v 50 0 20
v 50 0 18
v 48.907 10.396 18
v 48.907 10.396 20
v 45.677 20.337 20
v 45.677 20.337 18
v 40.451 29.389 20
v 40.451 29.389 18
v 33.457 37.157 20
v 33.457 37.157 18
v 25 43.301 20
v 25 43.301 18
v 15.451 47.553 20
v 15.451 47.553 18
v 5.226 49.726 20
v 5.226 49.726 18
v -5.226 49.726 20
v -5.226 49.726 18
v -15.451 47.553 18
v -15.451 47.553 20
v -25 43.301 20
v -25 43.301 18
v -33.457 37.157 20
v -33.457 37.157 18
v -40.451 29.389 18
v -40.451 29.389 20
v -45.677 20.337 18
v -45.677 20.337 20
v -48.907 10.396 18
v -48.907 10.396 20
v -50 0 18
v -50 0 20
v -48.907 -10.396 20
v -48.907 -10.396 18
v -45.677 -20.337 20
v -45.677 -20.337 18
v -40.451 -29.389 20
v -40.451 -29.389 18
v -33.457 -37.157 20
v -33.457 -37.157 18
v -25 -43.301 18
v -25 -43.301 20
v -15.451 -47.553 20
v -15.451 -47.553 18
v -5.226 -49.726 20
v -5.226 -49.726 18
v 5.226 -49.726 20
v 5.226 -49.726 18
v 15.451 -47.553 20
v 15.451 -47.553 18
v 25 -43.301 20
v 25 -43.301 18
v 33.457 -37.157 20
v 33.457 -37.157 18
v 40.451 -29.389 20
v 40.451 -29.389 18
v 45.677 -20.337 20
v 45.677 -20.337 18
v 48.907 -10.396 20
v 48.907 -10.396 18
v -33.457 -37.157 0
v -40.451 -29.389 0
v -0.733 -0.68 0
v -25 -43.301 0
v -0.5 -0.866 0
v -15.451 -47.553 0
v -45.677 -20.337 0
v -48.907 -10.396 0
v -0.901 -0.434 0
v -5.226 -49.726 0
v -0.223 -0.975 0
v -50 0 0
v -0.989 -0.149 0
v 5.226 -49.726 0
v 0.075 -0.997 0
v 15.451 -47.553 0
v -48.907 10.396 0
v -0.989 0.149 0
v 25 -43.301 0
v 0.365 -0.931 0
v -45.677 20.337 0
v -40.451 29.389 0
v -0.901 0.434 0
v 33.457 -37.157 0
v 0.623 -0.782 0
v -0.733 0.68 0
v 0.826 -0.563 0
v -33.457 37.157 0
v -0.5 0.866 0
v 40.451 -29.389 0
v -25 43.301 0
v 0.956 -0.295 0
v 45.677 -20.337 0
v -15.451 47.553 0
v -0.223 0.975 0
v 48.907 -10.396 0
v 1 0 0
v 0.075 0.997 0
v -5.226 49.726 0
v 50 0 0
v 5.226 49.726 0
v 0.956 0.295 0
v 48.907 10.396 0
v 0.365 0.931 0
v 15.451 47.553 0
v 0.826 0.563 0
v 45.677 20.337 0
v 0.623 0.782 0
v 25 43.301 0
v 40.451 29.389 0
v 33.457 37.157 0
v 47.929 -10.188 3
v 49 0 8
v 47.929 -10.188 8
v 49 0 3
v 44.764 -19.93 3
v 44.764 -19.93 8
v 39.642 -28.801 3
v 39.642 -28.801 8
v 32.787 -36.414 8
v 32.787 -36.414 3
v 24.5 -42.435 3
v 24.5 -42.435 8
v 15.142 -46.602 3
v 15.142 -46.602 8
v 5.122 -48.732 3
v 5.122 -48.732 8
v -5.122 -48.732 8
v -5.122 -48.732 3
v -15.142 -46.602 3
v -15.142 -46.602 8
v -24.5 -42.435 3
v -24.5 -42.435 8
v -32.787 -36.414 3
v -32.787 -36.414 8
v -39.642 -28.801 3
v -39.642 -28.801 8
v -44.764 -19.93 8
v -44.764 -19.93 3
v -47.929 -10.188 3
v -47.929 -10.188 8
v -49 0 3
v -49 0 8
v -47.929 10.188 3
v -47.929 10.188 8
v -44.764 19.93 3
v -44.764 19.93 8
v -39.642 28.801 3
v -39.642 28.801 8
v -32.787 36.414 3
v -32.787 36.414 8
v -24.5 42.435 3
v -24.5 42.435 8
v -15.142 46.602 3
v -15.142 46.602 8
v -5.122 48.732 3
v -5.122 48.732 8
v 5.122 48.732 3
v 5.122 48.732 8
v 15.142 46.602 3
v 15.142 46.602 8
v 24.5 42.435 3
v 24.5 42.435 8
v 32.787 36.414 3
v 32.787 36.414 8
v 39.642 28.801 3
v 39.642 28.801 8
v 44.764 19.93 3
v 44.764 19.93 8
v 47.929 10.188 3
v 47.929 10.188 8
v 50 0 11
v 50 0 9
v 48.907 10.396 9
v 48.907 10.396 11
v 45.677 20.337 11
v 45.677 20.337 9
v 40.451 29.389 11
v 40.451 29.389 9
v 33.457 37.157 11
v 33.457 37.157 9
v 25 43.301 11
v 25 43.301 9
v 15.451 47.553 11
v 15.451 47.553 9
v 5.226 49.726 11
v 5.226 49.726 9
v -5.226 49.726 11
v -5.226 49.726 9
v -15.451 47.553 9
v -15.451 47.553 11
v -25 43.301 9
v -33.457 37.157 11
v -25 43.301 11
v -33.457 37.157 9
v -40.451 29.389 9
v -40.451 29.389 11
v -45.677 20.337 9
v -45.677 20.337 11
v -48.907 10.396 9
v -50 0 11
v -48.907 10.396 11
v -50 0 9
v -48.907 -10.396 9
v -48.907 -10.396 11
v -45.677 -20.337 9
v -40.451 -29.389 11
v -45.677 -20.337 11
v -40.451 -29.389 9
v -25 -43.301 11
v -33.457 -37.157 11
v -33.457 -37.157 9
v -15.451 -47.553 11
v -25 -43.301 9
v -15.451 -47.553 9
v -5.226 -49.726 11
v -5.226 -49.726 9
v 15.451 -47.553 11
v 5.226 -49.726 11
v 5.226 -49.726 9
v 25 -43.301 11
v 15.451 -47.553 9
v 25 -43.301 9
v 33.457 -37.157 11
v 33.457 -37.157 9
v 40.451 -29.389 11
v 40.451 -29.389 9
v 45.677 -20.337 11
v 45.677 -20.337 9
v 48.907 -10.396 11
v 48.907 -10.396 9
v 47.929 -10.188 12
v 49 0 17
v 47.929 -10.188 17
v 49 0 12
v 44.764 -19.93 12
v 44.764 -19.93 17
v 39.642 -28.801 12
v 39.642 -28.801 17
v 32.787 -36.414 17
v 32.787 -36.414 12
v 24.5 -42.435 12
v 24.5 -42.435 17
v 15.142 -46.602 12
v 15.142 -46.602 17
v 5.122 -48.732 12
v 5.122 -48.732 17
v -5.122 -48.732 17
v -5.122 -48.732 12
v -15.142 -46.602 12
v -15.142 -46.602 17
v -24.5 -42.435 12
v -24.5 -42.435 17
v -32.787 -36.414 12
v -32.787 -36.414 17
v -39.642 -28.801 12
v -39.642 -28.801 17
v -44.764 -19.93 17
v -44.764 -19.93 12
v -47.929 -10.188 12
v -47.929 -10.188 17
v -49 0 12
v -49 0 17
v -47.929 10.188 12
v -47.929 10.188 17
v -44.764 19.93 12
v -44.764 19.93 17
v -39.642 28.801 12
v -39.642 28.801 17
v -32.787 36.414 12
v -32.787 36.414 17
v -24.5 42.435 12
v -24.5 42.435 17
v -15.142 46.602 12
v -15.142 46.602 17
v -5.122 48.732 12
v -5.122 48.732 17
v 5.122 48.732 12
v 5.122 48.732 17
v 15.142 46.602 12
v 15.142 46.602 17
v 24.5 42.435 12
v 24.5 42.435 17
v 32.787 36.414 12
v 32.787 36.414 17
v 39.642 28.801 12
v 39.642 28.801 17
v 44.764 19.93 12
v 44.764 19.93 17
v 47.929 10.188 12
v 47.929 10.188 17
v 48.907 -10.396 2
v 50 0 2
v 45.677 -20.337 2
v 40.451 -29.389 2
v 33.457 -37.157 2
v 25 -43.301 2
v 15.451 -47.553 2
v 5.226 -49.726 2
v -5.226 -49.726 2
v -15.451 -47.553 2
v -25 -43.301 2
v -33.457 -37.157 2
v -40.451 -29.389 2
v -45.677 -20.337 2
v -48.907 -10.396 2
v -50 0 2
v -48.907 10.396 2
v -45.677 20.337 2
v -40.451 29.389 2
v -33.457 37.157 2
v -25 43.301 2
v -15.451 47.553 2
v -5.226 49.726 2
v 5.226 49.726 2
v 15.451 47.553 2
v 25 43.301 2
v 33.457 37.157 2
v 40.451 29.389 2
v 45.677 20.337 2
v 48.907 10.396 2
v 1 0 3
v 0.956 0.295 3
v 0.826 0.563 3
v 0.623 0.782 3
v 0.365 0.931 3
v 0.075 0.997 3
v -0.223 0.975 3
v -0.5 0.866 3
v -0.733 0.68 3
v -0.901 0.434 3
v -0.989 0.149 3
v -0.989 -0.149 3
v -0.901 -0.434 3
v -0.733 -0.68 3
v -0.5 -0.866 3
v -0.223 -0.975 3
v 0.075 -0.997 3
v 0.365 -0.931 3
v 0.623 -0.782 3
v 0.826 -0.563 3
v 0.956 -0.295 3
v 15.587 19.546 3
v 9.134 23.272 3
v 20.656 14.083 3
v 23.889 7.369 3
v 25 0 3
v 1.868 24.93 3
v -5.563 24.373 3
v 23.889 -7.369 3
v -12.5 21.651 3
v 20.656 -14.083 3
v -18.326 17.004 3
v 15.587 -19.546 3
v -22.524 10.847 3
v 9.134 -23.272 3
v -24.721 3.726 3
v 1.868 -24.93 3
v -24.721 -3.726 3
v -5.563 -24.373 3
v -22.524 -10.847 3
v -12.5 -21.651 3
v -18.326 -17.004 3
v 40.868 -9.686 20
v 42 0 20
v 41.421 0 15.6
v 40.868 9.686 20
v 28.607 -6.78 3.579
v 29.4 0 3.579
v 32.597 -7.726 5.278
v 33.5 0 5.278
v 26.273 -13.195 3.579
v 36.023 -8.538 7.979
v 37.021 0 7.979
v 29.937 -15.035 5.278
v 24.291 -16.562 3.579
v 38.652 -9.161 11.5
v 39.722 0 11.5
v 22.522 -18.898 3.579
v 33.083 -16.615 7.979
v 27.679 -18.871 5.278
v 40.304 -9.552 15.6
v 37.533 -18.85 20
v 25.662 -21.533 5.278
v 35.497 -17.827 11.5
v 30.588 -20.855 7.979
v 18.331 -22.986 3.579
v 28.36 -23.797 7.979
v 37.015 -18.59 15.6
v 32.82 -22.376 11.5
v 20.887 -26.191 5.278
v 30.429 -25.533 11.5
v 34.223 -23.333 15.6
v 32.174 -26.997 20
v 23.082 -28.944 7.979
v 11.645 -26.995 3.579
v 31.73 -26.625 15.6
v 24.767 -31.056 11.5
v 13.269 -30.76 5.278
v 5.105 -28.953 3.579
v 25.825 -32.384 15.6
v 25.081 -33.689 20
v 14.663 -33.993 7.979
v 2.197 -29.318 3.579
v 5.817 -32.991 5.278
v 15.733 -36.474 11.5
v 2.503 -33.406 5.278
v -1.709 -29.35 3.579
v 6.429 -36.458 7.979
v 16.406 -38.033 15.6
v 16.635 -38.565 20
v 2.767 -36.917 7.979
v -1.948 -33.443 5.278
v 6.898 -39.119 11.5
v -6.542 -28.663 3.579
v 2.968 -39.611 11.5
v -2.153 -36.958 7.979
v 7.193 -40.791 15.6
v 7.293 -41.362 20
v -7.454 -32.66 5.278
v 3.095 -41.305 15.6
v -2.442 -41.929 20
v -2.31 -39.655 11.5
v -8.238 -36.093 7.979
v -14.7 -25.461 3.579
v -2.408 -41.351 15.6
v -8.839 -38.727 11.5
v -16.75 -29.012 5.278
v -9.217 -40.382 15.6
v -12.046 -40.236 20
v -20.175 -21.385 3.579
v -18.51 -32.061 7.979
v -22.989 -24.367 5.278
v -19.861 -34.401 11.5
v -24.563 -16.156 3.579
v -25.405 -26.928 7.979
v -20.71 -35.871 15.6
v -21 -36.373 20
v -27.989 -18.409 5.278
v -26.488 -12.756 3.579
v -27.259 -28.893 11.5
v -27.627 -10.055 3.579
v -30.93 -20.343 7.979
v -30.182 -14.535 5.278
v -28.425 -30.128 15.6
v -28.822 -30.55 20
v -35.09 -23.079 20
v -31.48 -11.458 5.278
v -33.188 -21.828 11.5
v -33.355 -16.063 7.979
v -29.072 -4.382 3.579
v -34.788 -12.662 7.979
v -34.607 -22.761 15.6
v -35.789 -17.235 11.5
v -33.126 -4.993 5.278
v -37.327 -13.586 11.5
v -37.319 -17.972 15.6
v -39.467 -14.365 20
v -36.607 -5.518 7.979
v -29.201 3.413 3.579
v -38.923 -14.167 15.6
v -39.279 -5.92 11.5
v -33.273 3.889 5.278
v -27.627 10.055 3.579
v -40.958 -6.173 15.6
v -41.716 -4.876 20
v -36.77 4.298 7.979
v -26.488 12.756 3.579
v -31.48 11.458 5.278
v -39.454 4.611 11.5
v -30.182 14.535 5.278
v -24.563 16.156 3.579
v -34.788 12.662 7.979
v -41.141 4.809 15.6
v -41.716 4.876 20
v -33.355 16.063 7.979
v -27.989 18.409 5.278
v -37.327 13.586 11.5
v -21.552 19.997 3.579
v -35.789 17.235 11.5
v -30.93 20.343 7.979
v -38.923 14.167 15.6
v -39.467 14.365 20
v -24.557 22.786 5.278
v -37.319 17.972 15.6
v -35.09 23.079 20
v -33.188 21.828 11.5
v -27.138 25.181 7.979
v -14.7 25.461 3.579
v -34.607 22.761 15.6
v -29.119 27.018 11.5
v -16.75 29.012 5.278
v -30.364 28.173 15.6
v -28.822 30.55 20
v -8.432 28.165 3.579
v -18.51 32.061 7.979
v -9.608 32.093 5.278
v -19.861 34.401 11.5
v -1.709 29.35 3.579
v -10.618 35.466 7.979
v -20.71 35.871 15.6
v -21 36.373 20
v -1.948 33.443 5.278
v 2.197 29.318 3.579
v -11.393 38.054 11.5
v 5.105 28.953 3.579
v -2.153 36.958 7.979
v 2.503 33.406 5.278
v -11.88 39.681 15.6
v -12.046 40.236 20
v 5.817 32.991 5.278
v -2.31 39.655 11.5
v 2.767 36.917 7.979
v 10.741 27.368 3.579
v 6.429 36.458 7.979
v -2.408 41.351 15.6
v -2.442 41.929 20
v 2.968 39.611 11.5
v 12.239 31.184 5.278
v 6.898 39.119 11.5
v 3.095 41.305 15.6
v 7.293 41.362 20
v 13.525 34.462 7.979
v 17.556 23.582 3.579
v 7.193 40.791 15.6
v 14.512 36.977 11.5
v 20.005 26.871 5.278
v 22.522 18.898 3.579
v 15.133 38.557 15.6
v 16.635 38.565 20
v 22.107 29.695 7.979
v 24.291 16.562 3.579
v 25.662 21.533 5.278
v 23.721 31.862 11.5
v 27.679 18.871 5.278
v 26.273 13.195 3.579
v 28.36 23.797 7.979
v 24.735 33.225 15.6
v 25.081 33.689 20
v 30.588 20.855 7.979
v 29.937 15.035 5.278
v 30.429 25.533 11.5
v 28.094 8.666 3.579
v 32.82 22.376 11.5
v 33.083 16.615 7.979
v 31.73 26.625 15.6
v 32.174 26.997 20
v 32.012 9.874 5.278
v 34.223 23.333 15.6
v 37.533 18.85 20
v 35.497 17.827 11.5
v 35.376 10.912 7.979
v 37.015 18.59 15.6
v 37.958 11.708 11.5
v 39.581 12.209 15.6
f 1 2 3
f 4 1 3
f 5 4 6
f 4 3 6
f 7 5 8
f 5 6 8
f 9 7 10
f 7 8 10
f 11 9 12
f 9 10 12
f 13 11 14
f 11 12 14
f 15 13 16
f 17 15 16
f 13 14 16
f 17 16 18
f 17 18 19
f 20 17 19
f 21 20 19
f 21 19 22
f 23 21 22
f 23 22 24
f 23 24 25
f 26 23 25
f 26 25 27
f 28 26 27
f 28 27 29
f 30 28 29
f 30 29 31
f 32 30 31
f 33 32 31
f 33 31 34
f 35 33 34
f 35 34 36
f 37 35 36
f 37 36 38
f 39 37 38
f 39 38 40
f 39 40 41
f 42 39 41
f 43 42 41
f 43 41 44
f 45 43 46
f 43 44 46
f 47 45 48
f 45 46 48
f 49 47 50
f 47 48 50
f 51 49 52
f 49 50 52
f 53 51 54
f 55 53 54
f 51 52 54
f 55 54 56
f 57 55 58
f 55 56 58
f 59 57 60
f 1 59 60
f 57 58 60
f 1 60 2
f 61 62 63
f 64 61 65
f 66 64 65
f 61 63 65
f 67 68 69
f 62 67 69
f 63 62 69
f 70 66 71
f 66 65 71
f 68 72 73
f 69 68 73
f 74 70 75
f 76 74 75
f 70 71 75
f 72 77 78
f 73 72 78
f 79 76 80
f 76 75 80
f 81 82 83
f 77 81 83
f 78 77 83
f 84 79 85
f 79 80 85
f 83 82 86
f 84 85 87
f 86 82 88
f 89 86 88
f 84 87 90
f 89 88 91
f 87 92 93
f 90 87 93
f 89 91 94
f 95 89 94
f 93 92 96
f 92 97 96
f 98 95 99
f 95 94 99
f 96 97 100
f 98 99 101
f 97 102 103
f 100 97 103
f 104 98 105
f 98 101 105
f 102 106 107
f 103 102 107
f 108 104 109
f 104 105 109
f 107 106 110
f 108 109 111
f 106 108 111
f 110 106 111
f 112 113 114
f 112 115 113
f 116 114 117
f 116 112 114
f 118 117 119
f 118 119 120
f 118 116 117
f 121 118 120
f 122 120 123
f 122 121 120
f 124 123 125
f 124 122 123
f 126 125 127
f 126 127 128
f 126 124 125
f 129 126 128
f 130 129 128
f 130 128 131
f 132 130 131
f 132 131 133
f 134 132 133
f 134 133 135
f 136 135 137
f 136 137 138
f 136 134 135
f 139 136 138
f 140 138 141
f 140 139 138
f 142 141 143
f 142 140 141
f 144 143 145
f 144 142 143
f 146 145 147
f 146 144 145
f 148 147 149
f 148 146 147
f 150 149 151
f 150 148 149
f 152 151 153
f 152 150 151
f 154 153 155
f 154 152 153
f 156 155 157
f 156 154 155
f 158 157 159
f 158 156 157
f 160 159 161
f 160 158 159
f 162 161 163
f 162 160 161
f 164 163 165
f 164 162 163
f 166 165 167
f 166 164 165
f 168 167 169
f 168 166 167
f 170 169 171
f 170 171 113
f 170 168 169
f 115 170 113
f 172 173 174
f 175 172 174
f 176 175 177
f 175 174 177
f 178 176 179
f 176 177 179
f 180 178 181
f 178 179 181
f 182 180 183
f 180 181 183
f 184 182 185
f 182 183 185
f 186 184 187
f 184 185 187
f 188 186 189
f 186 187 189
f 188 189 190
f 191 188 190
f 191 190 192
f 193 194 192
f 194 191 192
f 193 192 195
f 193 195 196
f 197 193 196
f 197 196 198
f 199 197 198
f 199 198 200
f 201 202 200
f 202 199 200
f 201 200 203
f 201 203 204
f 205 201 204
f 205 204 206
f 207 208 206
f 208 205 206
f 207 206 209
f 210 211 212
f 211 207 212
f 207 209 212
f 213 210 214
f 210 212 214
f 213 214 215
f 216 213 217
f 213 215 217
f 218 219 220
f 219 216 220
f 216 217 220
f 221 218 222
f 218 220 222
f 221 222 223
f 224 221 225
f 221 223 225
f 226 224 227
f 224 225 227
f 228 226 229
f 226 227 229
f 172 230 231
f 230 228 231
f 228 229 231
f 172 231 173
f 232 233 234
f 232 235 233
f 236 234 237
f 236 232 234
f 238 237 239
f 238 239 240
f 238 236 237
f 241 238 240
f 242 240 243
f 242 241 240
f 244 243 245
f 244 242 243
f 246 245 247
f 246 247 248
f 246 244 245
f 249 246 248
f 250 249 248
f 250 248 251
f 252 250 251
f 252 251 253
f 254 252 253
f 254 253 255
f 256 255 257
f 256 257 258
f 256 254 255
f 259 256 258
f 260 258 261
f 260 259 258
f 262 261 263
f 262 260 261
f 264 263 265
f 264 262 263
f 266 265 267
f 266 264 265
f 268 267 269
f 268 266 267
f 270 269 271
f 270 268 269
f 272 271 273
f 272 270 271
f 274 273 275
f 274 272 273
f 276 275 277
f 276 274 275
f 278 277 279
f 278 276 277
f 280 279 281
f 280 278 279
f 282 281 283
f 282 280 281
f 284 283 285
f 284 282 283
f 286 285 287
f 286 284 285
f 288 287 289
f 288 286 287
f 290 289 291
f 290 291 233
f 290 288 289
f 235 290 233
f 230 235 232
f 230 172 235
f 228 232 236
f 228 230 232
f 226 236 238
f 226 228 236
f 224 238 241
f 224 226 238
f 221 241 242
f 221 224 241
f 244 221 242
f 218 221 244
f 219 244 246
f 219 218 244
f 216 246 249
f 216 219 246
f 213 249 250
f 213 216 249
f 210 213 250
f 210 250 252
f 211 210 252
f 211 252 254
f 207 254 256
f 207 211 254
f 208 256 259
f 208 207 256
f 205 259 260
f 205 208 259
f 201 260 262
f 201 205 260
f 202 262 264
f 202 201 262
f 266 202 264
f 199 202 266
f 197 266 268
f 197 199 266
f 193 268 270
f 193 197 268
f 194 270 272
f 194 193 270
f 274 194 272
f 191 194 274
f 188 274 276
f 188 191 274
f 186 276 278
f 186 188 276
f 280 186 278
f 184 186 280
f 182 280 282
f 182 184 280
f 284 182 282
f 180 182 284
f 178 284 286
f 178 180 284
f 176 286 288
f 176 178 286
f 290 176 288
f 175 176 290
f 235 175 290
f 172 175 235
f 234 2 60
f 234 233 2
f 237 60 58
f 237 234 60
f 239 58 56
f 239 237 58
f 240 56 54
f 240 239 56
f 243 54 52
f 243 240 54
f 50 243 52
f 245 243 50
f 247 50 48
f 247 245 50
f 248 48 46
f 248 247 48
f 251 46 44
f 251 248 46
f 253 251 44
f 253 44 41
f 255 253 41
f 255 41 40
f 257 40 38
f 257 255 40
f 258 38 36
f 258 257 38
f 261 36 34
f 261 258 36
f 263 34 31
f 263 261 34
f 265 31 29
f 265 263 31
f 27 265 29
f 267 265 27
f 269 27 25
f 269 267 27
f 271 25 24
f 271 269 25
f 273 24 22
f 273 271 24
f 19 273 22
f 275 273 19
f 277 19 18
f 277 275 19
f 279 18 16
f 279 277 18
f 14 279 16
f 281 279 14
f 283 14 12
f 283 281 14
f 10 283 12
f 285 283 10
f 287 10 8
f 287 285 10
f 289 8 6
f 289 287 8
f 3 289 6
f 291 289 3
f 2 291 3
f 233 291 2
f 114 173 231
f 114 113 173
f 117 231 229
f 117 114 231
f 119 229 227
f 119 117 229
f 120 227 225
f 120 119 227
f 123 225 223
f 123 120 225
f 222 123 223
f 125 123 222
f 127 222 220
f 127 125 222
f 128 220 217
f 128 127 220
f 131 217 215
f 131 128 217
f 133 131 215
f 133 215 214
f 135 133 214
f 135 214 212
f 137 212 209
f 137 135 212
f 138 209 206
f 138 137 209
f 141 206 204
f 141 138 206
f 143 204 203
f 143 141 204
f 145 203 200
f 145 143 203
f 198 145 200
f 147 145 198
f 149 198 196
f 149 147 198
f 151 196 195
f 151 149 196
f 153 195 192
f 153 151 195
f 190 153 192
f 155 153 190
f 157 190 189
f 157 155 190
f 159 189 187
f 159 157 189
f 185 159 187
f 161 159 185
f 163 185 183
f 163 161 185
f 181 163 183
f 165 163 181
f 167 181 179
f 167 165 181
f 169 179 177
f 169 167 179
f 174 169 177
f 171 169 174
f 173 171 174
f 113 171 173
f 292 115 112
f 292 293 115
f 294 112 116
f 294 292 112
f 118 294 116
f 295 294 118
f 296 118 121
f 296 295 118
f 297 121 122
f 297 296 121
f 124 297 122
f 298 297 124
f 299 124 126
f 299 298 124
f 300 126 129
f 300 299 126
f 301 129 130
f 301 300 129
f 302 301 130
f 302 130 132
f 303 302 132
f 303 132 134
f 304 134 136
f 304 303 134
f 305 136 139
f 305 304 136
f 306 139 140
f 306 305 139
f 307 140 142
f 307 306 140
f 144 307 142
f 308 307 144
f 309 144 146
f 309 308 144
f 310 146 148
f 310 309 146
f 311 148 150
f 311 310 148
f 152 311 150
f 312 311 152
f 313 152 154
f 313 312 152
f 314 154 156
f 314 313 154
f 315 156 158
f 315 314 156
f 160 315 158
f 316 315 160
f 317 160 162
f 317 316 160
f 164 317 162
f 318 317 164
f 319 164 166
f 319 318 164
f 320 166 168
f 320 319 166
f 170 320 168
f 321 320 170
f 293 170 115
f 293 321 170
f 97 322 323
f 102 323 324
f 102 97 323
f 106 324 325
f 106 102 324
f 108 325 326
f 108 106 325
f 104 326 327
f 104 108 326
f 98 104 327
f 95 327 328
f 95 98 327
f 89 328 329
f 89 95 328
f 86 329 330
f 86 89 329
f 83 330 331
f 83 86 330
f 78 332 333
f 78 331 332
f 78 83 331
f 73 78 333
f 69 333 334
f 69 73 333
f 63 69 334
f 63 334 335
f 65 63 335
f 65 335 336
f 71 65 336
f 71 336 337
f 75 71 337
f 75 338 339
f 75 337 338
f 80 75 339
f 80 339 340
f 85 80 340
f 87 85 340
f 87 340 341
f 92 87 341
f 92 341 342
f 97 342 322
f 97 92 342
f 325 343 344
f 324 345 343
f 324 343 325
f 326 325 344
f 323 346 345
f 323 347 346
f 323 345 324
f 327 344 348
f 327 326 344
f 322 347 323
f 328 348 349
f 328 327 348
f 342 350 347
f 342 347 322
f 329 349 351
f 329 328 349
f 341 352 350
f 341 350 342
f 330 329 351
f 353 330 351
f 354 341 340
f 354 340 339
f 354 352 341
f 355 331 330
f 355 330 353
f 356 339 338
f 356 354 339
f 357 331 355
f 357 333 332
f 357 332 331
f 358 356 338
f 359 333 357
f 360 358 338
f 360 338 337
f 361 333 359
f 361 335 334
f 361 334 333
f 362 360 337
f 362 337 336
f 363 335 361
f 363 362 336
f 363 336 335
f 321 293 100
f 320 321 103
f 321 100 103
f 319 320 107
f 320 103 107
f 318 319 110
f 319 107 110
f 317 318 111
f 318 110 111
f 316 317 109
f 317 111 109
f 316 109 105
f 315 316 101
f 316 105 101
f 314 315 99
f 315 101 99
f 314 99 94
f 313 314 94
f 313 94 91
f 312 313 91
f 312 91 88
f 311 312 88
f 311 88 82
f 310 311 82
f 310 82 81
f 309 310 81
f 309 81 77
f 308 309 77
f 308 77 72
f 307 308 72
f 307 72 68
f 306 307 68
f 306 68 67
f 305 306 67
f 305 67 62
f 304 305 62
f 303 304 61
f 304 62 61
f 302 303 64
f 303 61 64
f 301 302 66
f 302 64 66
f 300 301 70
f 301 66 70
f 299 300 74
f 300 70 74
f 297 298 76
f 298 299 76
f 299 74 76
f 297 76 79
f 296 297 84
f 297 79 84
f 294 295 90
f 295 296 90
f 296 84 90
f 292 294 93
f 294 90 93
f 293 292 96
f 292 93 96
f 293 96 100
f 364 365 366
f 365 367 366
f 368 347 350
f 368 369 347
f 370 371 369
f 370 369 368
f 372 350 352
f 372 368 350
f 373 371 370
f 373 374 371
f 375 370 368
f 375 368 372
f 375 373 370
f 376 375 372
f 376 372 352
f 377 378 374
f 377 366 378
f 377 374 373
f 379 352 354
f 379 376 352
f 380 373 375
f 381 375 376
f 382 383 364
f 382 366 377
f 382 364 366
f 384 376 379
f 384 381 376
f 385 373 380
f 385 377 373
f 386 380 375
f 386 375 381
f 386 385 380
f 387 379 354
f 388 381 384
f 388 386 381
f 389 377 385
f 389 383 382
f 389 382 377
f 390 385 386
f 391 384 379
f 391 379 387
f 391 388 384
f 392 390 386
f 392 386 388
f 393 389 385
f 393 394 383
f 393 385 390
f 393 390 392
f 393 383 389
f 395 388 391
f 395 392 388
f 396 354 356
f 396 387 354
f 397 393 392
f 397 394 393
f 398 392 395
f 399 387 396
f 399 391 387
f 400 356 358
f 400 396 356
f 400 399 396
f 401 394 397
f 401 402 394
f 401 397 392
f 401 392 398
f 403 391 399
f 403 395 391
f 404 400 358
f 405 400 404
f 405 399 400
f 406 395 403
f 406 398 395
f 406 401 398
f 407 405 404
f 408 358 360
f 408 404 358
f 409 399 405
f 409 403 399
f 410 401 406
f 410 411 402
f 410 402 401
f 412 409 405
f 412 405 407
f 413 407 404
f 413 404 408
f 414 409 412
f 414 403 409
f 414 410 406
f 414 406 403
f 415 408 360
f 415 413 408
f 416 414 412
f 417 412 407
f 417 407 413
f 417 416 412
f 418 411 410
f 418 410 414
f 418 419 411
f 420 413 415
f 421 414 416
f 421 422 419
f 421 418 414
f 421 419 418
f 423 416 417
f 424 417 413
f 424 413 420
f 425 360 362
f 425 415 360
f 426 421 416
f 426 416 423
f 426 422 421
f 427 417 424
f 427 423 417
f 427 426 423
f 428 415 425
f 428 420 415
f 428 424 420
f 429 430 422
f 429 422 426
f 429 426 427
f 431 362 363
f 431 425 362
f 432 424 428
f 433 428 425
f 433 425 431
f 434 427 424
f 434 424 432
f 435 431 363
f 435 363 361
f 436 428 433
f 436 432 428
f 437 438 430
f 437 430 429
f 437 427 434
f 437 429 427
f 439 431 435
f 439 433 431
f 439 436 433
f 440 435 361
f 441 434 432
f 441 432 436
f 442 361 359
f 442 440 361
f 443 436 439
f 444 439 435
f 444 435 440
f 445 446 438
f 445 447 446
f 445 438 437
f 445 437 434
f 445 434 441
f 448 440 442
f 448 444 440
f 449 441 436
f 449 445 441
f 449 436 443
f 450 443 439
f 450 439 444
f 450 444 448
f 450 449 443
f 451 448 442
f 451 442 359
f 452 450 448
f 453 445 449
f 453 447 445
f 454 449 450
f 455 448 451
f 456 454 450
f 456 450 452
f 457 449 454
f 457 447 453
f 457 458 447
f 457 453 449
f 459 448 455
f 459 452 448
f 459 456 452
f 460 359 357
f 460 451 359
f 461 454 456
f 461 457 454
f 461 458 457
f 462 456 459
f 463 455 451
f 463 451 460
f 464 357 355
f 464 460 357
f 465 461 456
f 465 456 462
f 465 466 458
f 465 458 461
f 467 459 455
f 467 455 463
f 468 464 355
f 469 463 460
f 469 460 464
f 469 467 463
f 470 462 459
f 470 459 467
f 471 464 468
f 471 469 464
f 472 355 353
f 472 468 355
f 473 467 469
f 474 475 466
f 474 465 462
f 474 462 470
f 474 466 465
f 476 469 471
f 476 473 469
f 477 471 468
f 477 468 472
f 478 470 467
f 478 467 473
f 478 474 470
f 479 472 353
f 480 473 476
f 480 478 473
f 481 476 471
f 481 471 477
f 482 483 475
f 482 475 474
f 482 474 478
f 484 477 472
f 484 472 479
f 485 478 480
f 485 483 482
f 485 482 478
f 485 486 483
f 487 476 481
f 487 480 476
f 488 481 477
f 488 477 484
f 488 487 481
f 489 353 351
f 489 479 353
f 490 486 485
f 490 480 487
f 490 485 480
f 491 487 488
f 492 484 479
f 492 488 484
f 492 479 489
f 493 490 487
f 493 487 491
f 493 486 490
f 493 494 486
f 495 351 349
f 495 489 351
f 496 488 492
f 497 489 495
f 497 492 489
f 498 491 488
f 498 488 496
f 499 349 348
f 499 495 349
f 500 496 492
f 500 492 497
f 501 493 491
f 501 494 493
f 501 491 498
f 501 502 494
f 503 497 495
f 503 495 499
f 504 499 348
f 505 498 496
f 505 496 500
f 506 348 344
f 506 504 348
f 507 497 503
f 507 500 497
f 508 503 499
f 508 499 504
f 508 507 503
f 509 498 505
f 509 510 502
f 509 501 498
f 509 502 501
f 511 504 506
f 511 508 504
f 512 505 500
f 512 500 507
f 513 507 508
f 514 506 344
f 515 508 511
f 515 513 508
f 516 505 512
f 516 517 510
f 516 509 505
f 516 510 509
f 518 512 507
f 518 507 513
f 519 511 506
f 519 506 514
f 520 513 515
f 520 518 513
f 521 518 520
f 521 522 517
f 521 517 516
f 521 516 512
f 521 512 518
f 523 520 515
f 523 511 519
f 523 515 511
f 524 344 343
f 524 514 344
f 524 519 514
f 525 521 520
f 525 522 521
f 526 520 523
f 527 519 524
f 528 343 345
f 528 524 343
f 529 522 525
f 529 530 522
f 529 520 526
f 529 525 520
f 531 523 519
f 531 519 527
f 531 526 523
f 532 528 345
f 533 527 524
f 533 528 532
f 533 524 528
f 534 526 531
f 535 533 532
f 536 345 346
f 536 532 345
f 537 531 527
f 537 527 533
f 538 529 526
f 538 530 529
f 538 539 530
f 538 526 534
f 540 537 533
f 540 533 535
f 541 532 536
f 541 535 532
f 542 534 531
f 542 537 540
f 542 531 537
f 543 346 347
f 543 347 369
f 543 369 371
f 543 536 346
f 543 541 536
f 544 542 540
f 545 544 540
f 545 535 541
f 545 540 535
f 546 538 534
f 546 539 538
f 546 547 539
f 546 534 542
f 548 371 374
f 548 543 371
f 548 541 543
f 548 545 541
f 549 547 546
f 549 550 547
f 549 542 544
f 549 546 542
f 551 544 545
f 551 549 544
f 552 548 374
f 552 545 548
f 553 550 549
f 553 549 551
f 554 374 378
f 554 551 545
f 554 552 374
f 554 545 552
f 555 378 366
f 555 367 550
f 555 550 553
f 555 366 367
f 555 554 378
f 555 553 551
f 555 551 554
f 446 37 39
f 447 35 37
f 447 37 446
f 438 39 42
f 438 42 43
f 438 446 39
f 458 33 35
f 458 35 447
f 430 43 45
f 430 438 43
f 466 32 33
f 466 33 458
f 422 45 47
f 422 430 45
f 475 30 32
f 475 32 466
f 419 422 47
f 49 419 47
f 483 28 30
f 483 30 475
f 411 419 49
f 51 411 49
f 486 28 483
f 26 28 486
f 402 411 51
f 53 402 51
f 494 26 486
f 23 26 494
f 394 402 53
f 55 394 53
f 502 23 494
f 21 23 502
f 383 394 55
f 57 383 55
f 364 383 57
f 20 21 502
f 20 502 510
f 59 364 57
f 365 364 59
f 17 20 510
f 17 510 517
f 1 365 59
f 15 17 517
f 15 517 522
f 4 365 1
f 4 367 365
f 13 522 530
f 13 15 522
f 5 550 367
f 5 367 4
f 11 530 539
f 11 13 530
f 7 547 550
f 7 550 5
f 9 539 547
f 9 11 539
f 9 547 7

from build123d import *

# Parameters (mm, degrees)
SKETCH1_R           = 50
SKETCH1_R_2         = 1
BOSS_EXTRUDE1_DEPTH = 20


with BuildPart() as part:
    # Sketch1 → Boss-Extrude1 (new body)
    with BuildSketch(Plane.XY):
        Circle(SKETCH1_R)
        Circle(SKETCH1_R_2, mode=Mode.SUBTRACT)
    extrude(amount=BOSS_EXTRUDE1_DEPTH)

    # Sketch2 → Cut-Revolve1 (revolve, cut)
    with BuildSketch(Plane(origin=(0, 0, 0), x_dir=(0, 0, -1), z_dir=(1, 0, 0)), mode=Mode.PRIVATE) as cut_revolve1_sk:
        Polygon((-18, 50), (-17, 49), (-12, 49), (-11, 50), align=None)
        Polygon((-9, 50), (-8, 49), (-3, 49), (-2, 50), align=None)
    revolve(cut_revolve1_sk.sketch.rotate(Axis((0, 0, 1011.858451466), (0, 0, -1)), 90), axis=Axis((0, 0, 1011.858451466), (0, 0, -1)), mode=Mode.SUBTRACT)

    # Sketch4 → Cut-Revolve2 (revolve, cut)
    with BuildSketch(Plane(origin=(0, 0, 0), x_dir=(0, 0, -1), z_dir=(1, 0, 0)), mode=Mode.PRIVATE) as cut_revolve2_sk:
        with BuildLine():
            Line((-3, 0), (-3, 25))
            ThreePointArc((-3, 25), (-7.97918472, 37.02081528), (-20, 42))
            Line((-20, 42), (-20, 0))
            Line((-20, 0), (-3, 0))
        make_face()
    revolve(cut_revolve2_sk.sketch.rotate(Axis((0, 0, 1012), (0, 0, -1)), 90), axis=Axis((0, 0, 1012), (0, 0, -1)), mode=Mode.SUBTRACT)


solid = part.part
